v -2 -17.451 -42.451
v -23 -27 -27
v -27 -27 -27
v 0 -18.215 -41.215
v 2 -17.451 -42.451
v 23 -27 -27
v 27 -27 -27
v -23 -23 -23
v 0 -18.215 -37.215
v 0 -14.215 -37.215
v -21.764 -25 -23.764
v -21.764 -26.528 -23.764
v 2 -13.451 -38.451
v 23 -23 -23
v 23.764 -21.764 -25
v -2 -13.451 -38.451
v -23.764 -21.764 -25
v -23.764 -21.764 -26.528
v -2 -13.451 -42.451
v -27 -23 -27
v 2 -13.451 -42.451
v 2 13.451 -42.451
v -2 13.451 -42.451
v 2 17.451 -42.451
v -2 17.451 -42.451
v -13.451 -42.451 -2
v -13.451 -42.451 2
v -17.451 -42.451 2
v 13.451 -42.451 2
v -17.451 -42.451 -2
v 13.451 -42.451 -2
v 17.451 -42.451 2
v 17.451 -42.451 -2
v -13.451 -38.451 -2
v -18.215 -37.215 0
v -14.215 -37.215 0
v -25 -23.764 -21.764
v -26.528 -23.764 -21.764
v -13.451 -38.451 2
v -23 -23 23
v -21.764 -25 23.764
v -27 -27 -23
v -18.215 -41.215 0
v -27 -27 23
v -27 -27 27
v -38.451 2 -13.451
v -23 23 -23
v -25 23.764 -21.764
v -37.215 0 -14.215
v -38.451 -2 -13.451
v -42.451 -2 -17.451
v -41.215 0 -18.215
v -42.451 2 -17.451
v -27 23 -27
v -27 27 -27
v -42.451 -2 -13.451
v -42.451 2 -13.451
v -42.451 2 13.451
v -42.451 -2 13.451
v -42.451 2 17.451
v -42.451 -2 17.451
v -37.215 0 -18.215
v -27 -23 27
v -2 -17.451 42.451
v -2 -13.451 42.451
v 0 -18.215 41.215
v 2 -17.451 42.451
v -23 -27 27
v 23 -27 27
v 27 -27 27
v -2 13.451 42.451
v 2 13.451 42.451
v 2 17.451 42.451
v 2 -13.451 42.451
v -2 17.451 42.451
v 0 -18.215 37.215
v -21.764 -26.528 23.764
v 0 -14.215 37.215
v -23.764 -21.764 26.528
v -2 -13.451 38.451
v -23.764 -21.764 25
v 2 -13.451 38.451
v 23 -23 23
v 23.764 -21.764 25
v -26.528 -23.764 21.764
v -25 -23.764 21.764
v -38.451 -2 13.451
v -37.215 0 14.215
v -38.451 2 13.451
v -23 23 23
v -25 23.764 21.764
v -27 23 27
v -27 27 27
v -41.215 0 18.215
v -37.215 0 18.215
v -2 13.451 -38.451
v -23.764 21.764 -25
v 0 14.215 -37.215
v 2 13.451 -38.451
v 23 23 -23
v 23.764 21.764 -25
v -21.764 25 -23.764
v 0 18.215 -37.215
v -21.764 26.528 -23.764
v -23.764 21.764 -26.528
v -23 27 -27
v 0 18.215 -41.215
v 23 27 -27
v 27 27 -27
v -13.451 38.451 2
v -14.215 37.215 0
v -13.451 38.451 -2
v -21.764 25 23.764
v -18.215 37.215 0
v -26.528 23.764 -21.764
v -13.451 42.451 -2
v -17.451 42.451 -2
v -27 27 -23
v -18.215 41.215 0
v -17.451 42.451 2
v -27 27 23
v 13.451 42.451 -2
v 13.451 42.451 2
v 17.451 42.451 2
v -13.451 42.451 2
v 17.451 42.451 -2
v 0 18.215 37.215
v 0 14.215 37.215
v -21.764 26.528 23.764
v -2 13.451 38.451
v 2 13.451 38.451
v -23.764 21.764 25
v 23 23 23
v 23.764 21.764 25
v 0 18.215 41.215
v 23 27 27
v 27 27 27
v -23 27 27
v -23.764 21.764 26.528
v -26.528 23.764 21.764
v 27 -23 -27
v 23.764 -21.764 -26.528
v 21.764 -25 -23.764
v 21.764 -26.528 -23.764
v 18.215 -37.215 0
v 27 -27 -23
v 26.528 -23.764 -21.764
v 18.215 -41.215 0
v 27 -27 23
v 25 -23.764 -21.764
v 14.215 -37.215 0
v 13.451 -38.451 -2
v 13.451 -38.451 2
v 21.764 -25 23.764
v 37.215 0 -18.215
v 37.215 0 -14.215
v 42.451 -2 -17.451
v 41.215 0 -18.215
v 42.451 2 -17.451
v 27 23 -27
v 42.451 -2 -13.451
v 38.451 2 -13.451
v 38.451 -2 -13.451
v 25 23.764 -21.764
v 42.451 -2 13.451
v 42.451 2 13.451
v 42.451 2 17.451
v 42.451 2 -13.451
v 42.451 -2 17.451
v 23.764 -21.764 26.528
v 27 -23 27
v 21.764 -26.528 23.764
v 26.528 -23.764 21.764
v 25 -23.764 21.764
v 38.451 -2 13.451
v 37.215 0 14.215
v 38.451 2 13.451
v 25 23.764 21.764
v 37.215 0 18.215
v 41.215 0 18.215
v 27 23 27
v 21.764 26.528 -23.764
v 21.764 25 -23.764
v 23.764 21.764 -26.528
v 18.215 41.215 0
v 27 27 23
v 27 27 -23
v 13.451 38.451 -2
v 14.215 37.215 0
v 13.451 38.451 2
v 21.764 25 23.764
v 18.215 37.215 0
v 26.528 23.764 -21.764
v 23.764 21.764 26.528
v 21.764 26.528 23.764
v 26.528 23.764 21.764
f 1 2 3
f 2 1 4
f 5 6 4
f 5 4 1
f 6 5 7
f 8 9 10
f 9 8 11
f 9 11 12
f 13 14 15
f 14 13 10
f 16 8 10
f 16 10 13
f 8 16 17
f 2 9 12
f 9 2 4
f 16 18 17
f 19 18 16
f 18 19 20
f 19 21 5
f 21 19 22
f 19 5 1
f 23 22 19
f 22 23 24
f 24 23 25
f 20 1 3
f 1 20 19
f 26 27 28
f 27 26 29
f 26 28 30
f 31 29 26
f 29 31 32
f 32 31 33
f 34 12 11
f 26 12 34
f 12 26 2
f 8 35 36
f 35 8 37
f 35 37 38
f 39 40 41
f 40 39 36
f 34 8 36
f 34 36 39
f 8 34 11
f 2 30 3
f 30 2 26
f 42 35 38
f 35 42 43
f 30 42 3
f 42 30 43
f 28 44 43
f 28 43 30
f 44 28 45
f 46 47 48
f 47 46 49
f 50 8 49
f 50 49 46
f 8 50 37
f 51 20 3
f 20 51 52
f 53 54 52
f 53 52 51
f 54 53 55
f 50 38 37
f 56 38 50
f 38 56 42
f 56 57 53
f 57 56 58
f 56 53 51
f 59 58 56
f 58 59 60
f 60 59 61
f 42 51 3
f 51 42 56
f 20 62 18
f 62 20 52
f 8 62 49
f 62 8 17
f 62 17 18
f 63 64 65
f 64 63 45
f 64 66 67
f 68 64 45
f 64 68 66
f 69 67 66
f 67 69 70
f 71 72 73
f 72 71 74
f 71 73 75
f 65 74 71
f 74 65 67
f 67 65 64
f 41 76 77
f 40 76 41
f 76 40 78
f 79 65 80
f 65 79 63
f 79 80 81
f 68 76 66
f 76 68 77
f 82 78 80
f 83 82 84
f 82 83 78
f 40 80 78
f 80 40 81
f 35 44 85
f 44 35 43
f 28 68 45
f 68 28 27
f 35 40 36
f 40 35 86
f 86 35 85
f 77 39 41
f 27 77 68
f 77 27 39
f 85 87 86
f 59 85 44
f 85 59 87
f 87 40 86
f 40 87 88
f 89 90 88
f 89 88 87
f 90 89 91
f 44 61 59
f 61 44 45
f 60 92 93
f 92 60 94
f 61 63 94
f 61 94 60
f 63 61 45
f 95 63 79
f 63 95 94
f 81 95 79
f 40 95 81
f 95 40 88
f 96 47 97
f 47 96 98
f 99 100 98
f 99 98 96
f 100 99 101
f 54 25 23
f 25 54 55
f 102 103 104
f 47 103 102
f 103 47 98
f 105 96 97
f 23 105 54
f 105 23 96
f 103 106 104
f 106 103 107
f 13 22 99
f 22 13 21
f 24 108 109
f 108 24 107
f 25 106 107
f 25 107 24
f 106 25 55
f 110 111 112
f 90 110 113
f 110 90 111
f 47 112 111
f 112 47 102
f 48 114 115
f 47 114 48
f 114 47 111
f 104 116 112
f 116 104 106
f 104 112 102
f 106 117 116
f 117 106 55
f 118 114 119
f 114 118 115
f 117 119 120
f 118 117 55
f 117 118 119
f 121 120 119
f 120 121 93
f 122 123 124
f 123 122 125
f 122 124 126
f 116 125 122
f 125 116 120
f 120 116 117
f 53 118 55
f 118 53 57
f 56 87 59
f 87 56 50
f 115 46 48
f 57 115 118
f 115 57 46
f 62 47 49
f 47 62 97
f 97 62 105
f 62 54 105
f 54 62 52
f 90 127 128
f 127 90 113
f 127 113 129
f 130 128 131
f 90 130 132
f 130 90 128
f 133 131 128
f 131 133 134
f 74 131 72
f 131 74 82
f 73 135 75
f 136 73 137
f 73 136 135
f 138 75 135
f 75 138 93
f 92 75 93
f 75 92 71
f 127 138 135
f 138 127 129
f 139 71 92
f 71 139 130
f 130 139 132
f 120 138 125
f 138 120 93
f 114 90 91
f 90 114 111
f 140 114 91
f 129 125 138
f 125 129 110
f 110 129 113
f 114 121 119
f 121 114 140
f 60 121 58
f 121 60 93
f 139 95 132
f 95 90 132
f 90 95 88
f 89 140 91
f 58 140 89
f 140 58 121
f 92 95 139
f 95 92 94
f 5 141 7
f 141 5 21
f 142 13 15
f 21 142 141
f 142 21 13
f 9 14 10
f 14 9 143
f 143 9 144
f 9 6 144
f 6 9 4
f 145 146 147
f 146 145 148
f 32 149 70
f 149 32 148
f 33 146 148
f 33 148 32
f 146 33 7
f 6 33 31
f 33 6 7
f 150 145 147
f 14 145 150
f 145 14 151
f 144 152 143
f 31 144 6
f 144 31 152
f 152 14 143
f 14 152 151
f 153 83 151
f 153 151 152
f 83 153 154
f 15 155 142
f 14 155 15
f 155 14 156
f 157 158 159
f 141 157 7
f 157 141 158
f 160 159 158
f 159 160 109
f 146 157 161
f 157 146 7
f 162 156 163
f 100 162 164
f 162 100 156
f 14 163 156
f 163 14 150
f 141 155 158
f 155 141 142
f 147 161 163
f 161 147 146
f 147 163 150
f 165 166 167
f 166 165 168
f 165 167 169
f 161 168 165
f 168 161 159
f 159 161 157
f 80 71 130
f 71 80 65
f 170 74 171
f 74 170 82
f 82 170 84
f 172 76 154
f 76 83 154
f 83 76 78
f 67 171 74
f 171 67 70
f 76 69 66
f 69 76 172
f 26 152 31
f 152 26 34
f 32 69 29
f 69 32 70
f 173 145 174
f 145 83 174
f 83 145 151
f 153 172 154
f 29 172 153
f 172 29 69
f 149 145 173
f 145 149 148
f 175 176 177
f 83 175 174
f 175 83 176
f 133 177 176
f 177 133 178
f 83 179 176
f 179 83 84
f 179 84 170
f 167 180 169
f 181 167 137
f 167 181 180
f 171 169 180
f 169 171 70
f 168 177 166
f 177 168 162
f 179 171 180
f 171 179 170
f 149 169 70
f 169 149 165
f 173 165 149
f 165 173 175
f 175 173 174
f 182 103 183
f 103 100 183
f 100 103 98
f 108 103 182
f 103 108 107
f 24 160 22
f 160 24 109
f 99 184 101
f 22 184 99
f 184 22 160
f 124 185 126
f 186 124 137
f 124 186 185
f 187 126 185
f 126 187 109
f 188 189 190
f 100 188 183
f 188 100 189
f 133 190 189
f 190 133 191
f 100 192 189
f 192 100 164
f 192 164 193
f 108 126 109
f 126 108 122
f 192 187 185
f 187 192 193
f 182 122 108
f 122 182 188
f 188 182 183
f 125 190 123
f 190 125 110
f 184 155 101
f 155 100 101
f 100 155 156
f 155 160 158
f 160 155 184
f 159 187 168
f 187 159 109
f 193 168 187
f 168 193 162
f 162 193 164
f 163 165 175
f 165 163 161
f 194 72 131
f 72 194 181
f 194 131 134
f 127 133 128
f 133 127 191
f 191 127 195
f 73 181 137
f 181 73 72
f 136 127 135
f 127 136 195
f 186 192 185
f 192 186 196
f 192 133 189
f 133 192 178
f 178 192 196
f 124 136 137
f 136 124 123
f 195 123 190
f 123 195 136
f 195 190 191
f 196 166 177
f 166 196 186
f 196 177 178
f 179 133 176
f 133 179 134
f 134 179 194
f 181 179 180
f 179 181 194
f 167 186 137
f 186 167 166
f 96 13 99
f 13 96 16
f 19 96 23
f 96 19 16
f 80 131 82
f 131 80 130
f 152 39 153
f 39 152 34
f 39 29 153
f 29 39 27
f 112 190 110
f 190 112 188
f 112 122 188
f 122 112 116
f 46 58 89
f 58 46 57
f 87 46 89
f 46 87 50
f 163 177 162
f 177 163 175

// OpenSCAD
// Platonic solids
// http://en.wikipedia.org/wiki/Platonic_solid
// by Mike Koss (c) 2014

PART = "dodecahedron"; // [tetrahedron, cube, octahedron, dodecahedron, icosahedron]]

S=100;
THICKNESS=4;
SCALE=25;
PHI=(1 + sqrt(5))/2;
E = 0.1;

$fa=3;
$fs=1;

if (PART == "tetrahedron")
  polyhedron([
      [1, 1, 1],
      [1, -1, -1],
      [-1, 1, -1],
      [-1, -1, 1]
    ],
    s=2.83);

if (PART == "octahedron")
  polyhedron([
      [1, 0, 0], [0, 1, 0], [-1, 0, 0],
      [0, -1, 0], [0, 0, 1], [0, 0, -1]
    ],
    s=1.42);

if (PART == "cube")
  polyhedron([
      [-1, -1, -1], [-1, -1, 1], [-1, 1, -1], [-1, 1, 1],
      [1, -1, -1], [1, -1, 1], [1, 1, -1], [1, 1, 1]
    ],
    s=2.01);

if (PART == "dodecahedron")
  polyhedron([
      [-1, -1, -1], [-1, -1, 1], [-1, 1, -1], [-1, 1, 1],
      [1, -1, -1], [1, -1, 1], [1, 1, -1], [1, 1, 1],
      [0, -1/PHI, -PHI], [0, -1/PHI, PHI], [0, 1/PHI, -PHI], [0, 1/PHI, PHI],
      [-1/PHI, -PHI, 0], [-1/PHI, PHI, 0], [1/PHI, -PHI, 0], [1/PHI, PHI, 0],
      [-PHI, 0, -1/PHI], [-PHI, 0, 1/PHI], [PHI, 0, -1/PHI], [PHI, 0, 1/PHI]
    ],
    s=1.3);

if (PART == "icosahedron")
  polyhedron([
      [0, -1, -PHI], [0, 1, -PHI], [0, -1, PHI], [0, 1, PHI],
      [-1, -PHI, 0], [-1, PHI, 0], [1, -PHI, 0], [1, PHI, 0],
      [-PHI, 0, -1], [-PHI, 0, 1], [PHI, 0, -1], [PHI, 0, 1],
    ],
    s=2);

module polyhedron(v, s, xform=SCALE, width=THICKNESS) {
  d = dist(v[0] - v[1]);
  for (i = [0: len(v) - 2]) {
    for (j = [i + 1: len(v) - 1]) {
      if (dist(v[i] - v[j]) <= s) {
        edge(xform * v[i], xform * v[j], width=width);
      }
    }
  }
}

module edge(from, to, width=1) {
  hull() {
    translate(from) cube([width, width, width], center=true);
    translate(to) cube([width, width, width], center=true);
  }
}

function rotxy(a) = [
    [cos(a), -sin(a), 0],
    [sin(a), cos(a),  0],
    [0,      0,       1]
  ];

function rotxz(a) = [
    [cos(a), 0, -sin(a)],
    [0,      1,       0],
    [sin(a), 0, cos(a)]
  ];

function rotyz(a) = [
    [1, 0,      0],
    [0, cos(a), -sin(a)],
    [0, sin(a), cos(a)]
  ];

function dist(pos) = sqrt(pos * pos);
